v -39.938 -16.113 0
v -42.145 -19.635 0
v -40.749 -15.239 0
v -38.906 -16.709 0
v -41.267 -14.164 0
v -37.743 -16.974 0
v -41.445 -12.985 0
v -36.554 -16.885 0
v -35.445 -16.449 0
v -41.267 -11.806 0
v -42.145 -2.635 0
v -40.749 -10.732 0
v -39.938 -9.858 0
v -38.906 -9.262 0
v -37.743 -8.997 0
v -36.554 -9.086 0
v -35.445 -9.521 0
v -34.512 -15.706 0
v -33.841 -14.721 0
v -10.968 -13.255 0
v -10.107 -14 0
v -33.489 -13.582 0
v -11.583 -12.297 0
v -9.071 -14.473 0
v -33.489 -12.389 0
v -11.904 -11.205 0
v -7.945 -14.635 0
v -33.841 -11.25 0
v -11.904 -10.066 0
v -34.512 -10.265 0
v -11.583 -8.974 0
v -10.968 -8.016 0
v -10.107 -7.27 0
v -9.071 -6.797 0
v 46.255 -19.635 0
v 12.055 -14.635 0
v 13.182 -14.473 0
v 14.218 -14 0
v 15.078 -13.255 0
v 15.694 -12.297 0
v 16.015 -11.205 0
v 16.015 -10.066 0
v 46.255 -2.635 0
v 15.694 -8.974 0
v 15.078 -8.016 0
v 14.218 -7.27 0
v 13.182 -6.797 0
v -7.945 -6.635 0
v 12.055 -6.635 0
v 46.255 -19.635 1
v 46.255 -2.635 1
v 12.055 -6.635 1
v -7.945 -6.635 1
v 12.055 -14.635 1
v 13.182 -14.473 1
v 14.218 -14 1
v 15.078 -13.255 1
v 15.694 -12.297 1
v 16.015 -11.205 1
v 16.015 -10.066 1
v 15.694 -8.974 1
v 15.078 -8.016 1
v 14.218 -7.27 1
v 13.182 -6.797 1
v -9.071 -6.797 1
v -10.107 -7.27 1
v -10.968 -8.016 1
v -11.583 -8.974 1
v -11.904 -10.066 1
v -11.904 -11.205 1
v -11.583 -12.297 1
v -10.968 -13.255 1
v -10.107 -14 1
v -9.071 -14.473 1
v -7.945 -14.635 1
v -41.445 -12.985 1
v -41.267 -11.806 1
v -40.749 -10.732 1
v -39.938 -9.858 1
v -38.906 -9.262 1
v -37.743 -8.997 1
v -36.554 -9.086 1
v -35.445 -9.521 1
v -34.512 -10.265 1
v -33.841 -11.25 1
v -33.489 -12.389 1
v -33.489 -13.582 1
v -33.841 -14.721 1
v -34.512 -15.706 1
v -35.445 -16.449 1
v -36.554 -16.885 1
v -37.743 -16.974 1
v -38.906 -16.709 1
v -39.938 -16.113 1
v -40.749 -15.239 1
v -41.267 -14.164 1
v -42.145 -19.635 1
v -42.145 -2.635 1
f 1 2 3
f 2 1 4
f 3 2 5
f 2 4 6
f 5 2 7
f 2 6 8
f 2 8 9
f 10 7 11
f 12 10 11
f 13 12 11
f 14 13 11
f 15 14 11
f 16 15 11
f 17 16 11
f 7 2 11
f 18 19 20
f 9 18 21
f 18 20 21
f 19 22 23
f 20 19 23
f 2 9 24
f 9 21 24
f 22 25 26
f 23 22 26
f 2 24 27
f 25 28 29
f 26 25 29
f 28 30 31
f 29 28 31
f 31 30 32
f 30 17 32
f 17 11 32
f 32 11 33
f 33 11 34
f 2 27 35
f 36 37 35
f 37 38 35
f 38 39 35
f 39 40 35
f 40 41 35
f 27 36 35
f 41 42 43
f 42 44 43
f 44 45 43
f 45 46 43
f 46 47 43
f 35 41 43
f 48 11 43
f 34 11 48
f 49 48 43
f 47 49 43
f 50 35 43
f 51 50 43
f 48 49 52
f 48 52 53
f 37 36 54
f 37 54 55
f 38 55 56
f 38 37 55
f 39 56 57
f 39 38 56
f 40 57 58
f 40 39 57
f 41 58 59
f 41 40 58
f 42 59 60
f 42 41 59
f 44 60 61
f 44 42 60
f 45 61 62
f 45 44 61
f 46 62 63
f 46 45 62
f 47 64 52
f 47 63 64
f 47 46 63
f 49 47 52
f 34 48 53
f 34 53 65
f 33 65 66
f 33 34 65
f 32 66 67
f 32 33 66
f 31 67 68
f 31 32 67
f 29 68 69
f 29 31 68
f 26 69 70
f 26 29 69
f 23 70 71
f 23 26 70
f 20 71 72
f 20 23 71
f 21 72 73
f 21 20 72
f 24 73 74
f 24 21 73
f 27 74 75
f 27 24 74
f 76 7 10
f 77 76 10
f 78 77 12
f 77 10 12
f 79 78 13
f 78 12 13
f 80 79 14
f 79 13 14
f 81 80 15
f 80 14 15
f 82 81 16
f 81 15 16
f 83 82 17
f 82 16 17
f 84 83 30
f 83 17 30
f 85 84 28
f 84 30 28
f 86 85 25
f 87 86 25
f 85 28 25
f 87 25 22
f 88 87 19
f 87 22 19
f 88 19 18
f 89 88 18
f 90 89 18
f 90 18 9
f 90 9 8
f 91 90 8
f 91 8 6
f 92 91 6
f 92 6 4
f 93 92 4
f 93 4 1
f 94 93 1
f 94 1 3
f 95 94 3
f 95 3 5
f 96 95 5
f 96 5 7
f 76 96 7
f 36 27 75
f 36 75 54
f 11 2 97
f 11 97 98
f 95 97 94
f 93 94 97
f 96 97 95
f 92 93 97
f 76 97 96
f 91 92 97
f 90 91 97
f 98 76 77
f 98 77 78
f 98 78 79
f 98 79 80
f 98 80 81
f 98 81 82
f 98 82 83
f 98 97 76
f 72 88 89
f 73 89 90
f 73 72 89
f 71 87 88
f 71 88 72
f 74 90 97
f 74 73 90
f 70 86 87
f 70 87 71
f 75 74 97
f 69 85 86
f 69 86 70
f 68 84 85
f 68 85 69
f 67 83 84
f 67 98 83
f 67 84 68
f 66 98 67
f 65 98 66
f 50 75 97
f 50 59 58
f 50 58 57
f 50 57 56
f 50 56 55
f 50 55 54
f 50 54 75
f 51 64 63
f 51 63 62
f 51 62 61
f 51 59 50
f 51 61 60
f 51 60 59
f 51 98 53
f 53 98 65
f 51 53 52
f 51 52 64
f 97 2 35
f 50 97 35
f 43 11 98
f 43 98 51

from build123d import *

# Parameters (mm, degrees)
SKETCH1_W           = 88.4
SKETCH1_H           = 17
BOSS_EXTRUDE1_DEPTH = 1
SKETCH_1_R          = 4
CUT_EXTRUDE_1_DEPTH = 10


with BuildPart() as part:
    # Sketch1 → Boss-Extrude1 (new body)
    with BuildSketch(Plane.XY):
        with Locations((2.05547482, -11.135386556)):
            Rectangle(SKETCH1_W, SKETCH1_H)
    extrude(amount=BOSS_EXTRUDE1_DEPTH)

    # ｽｹｯﾁ1 → ｶｯﾄ - 押し出し1 (cut)
    with BuildSketch(Plane(origin=(0, 0, 0), x_dir=(-1, 0, 0), z_dir=(0, 0, -1))):
        with Locations((37.44452518, -12.985386556)):
            Circle(SKETCH_1_R)
        with BuildLine():
            Line((-12.05547482, -6.635386556), (7.94452518, -6.635386556))
            ThreePointArc((7.94452518, -6.635386556), (11.94452518, -10.635386556), (7.94452518, -14.635386556))
            Line((7.94452518, -14.635386556), (-12.05547482, -14.635386556))
            ThreePointArc((-12.05547482, -14.635386556), (-16.05547482, -10.635386556), (-12.05547482, -6.635386556))
        make_face()
    extrude(amount=-CUT_EXTRUDE_1_DEPTH, mode=Mode.SUBTRACT)


solid = part.part
